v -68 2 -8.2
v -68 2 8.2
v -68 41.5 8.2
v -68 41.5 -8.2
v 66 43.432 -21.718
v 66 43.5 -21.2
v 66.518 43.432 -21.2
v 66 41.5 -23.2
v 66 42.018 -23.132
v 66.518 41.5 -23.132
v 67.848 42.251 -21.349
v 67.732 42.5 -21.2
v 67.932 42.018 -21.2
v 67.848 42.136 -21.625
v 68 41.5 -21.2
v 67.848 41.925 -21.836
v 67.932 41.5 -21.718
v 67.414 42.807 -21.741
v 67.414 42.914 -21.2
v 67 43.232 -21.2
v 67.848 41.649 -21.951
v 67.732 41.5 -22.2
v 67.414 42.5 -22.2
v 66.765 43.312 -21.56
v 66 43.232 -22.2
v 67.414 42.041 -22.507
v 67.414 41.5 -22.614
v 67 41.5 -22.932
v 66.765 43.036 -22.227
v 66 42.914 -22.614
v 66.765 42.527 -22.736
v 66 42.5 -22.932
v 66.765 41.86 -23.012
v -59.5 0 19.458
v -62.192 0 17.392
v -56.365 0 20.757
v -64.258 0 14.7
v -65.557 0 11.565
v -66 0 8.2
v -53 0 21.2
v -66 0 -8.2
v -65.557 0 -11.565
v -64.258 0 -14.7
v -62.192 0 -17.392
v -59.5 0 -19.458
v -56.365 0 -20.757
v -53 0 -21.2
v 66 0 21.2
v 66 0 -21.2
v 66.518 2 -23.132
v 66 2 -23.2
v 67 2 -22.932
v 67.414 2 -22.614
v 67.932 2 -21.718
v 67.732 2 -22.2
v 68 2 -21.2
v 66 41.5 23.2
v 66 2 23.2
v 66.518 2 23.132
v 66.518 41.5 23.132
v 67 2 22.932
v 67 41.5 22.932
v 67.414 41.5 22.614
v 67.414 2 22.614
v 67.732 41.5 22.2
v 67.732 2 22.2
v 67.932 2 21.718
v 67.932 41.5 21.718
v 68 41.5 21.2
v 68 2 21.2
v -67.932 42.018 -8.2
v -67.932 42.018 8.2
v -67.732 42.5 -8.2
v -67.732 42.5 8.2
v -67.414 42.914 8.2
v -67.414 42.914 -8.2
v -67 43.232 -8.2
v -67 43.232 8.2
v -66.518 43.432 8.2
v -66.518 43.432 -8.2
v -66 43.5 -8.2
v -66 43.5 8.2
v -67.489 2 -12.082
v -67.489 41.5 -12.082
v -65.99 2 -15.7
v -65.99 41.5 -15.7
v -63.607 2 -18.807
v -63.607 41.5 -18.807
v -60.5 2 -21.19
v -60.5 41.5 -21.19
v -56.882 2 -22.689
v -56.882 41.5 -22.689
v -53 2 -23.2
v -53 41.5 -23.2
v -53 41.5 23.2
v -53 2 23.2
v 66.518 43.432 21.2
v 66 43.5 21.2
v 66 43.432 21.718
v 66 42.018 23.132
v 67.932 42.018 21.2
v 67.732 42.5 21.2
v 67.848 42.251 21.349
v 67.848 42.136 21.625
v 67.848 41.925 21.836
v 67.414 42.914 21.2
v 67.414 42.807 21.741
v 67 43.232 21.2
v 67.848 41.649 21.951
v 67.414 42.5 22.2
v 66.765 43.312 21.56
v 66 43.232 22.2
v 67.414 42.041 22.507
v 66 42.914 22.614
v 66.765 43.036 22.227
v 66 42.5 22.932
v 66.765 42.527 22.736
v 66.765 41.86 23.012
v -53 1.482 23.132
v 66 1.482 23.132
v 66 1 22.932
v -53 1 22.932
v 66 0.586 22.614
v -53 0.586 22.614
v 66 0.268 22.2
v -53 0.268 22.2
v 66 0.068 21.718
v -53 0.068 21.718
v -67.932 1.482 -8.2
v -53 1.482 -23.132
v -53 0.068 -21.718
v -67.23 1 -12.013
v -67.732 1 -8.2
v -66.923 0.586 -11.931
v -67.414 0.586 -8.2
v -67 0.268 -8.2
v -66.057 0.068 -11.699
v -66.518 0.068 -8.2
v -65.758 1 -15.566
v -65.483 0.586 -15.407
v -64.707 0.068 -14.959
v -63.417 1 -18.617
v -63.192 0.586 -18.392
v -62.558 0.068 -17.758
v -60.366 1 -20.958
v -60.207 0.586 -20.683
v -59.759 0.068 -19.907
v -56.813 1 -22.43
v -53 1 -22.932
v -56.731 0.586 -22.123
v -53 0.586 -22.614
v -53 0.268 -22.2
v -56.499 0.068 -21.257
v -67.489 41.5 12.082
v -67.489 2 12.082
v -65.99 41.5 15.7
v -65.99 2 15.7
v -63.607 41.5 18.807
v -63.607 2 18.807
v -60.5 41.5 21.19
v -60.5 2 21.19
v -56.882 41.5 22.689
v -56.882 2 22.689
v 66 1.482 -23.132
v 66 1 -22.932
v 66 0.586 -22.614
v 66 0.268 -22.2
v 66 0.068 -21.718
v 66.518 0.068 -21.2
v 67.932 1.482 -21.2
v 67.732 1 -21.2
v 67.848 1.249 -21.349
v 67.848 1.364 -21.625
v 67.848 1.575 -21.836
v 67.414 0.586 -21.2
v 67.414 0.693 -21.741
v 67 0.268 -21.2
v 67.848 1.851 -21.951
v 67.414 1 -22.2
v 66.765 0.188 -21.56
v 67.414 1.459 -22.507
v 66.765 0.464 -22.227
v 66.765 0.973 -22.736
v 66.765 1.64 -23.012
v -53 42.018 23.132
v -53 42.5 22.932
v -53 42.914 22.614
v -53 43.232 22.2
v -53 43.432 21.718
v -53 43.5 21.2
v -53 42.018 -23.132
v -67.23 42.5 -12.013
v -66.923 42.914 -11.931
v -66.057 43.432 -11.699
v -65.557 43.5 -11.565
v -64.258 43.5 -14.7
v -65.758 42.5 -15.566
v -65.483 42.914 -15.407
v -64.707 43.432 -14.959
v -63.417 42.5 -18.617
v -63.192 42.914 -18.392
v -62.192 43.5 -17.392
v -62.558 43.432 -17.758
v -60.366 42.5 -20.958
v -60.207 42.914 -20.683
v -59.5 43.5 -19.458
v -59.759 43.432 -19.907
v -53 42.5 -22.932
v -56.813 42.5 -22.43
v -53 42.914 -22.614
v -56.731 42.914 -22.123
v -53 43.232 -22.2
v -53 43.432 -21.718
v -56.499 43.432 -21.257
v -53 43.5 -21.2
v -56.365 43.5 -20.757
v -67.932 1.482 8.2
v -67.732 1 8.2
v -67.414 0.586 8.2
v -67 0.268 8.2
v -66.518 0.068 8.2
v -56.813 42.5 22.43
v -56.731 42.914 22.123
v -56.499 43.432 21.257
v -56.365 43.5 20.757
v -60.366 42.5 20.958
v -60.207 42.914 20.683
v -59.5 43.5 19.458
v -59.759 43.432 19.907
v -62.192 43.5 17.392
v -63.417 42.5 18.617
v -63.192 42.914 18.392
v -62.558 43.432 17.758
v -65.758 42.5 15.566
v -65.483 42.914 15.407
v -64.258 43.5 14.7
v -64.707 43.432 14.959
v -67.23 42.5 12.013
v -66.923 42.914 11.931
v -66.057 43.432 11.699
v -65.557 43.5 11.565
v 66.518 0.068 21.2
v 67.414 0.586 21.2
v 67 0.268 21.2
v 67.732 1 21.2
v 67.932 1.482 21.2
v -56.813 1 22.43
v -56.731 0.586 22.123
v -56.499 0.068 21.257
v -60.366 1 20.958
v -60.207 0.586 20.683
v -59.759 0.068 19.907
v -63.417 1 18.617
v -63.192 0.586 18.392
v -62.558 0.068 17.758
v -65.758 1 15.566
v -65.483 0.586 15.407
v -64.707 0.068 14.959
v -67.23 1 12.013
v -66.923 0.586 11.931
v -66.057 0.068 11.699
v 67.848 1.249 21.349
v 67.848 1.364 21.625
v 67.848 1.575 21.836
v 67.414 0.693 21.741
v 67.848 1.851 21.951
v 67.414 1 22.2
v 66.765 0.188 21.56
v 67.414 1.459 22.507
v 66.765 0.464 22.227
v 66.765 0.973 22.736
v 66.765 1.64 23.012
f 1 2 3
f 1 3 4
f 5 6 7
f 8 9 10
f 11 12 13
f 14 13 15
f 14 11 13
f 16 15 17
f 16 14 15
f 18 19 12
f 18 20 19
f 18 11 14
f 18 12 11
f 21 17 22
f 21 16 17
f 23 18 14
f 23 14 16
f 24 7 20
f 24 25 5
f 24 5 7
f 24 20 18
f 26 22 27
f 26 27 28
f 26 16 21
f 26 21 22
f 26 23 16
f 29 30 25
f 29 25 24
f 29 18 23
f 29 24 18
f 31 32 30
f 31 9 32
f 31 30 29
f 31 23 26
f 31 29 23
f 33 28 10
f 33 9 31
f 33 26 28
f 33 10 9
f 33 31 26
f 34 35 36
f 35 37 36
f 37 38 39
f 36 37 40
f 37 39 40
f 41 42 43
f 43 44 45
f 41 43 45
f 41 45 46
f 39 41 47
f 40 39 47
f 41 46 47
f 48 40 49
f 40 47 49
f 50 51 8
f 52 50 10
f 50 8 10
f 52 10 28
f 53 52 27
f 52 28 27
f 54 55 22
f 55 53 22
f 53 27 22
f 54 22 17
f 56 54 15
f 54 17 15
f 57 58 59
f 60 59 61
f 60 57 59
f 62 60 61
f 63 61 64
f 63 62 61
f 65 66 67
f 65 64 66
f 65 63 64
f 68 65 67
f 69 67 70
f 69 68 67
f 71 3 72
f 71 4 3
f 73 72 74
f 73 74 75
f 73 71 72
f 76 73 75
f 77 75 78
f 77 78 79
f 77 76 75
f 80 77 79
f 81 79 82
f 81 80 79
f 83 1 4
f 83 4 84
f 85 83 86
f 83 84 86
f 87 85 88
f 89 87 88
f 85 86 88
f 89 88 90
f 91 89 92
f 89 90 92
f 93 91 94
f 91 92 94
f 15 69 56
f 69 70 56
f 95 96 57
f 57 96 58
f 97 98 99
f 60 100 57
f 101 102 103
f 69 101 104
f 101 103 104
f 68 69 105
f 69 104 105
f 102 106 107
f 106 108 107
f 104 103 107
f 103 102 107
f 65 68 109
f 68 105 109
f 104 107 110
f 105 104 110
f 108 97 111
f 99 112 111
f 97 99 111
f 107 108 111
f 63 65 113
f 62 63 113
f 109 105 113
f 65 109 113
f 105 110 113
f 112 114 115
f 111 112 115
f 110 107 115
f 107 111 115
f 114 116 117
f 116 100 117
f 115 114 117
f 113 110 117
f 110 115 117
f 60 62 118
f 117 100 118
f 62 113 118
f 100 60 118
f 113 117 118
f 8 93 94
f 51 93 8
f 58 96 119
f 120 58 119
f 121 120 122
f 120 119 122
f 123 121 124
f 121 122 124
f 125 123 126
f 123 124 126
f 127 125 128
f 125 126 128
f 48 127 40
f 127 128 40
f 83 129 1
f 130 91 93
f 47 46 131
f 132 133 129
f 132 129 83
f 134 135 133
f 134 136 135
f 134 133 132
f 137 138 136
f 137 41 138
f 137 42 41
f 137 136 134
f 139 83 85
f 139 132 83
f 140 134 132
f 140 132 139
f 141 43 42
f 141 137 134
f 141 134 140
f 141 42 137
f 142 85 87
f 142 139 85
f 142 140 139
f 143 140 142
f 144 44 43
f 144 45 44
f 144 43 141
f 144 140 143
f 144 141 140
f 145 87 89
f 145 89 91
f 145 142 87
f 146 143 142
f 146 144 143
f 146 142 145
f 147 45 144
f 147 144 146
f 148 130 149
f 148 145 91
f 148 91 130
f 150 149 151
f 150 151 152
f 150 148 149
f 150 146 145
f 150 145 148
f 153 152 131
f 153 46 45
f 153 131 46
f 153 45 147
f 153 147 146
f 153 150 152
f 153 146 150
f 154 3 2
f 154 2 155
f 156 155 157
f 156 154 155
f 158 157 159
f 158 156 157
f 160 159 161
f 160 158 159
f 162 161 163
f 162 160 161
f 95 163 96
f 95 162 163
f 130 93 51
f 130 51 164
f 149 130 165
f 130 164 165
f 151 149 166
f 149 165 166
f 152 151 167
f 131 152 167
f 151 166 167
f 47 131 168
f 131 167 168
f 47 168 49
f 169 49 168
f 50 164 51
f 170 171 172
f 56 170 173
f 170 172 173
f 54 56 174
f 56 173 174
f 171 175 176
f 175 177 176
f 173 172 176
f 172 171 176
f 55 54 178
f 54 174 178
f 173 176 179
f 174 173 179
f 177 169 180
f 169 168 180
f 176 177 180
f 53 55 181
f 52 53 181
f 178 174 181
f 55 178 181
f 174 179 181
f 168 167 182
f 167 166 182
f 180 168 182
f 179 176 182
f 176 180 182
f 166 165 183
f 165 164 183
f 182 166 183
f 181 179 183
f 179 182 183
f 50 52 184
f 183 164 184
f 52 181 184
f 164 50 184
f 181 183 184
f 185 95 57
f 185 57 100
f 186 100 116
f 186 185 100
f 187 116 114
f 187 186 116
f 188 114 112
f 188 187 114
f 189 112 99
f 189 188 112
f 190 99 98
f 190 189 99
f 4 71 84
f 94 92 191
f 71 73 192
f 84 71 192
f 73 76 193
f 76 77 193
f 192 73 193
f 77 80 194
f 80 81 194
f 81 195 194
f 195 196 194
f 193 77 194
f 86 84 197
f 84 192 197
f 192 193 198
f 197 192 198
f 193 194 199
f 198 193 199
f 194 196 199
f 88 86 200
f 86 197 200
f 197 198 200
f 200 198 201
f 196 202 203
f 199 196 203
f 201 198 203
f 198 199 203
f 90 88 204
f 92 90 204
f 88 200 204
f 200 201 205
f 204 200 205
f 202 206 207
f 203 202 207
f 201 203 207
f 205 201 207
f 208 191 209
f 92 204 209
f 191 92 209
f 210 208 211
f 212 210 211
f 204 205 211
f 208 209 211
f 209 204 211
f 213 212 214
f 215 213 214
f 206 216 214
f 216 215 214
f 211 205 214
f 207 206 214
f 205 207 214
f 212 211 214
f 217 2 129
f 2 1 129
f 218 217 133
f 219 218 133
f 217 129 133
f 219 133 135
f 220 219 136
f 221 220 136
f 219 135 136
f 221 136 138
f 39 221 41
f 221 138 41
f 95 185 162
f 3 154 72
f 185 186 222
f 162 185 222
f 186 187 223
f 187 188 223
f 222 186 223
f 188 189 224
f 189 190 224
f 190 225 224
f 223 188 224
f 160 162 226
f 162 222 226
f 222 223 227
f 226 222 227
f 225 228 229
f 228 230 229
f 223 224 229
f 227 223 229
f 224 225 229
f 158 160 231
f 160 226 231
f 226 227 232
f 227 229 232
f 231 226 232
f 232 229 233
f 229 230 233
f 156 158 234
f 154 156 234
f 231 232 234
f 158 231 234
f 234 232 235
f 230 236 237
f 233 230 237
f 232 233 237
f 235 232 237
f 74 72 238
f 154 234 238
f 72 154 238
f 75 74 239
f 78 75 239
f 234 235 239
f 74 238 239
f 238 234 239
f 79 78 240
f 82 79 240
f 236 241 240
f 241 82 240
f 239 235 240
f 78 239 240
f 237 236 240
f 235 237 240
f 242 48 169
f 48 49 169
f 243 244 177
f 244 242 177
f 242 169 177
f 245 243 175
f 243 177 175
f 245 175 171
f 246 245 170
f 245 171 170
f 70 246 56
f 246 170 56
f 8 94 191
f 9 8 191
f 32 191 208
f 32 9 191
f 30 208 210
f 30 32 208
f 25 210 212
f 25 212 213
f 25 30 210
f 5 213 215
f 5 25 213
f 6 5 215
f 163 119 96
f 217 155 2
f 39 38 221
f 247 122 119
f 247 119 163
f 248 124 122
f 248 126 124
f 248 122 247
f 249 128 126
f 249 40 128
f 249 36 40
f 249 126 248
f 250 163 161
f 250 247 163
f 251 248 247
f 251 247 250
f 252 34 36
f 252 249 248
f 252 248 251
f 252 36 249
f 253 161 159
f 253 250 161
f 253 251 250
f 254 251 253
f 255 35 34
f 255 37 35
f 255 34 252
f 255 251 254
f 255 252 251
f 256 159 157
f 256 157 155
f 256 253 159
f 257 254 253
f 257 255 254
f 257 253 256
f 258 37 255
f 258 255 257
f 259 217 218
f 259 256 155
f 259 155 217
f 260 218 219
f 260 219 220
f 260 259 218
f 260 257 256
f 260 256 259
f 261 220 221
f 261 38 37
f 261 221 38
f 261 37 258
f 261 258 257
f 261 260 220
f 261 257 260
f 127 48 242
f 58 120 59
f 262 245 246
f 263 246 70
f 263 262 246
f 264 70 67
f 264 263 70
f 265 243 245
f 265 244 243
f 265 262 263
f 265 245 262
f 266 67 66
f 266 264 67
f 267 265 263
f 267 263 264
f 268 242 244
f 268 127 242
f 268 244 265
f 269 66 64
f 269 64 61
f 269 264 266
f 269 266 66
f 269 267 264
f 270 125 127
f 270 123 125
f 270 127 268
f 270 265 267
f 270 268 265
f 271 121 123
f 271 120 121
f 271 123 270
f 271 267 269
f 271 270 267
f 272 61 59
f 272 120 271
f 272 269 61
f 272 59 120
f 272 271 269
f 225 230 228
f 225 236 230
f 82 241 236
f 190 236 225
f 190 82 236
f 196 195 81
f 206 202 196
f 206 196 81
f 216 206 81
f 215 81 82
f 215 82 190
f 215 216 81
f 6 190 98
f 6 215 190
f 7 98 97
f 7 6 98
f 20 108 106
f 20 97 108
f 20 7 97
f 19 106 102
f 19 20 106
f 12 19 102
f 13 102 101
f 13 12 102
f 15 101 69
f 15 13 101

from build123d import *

# Parameters (mm, degrees)
SKETCH1_W           = 136
SKETCH1_H           = 46.4
BOSS_EXTRUDE1_DEPTH = 43.5
FILLET1_R           = 15
FILLET2_R           = 2


with BuildPart() as part:
    # Sketch1 → Boss-Extrude1 (new body)
    with BuildSketch(Plane(origin=(0, 0, 0), x_dir=(1, 0, 0), z_dir=(0, 1, 0))):
        Rectangle(SKETCH1_W, SKETCH1_H)
    extrude(amount=BOSS_EXTRUDE1_DEPTH)

    # Fillet1
    fillet1_edges = [part.edges().sort_by_distance(p)[0] for p in [
        (-68, 21.75, 23.2),
        (-68, 21.75, -23.2),
    ]]
    fillet(fillet1_edges, radius=FILLET1_R)

    # Fillet2
    fillet2_edges = [part.edges().sort_by_distance(p)[0] for p in [
        (-68, 0, 0),
        (-68, 43.5, 0),
        (7.5, 0, 23.2),
        (-63.606601718, 0, 18.806601718),
        (-63.606601718, 0, -18.806601718),
        (7.5, 43.5, 23.2),
        (-63.606601718, 43.5, 18.806601718),
        (-63.606601718, 43.5, -18.806601718),
        (68, 43.5, 0),
        (7.5, 0, -23.2),
        (68, 0, 0),
        (7.5, 43.5, -23.2),
        (68, 21.75, 23.2),
        (68, 21.75, -23.2),
    ]]
    fillet(fillet2_edges, radius=FILLET2_R)


solid = part.part
